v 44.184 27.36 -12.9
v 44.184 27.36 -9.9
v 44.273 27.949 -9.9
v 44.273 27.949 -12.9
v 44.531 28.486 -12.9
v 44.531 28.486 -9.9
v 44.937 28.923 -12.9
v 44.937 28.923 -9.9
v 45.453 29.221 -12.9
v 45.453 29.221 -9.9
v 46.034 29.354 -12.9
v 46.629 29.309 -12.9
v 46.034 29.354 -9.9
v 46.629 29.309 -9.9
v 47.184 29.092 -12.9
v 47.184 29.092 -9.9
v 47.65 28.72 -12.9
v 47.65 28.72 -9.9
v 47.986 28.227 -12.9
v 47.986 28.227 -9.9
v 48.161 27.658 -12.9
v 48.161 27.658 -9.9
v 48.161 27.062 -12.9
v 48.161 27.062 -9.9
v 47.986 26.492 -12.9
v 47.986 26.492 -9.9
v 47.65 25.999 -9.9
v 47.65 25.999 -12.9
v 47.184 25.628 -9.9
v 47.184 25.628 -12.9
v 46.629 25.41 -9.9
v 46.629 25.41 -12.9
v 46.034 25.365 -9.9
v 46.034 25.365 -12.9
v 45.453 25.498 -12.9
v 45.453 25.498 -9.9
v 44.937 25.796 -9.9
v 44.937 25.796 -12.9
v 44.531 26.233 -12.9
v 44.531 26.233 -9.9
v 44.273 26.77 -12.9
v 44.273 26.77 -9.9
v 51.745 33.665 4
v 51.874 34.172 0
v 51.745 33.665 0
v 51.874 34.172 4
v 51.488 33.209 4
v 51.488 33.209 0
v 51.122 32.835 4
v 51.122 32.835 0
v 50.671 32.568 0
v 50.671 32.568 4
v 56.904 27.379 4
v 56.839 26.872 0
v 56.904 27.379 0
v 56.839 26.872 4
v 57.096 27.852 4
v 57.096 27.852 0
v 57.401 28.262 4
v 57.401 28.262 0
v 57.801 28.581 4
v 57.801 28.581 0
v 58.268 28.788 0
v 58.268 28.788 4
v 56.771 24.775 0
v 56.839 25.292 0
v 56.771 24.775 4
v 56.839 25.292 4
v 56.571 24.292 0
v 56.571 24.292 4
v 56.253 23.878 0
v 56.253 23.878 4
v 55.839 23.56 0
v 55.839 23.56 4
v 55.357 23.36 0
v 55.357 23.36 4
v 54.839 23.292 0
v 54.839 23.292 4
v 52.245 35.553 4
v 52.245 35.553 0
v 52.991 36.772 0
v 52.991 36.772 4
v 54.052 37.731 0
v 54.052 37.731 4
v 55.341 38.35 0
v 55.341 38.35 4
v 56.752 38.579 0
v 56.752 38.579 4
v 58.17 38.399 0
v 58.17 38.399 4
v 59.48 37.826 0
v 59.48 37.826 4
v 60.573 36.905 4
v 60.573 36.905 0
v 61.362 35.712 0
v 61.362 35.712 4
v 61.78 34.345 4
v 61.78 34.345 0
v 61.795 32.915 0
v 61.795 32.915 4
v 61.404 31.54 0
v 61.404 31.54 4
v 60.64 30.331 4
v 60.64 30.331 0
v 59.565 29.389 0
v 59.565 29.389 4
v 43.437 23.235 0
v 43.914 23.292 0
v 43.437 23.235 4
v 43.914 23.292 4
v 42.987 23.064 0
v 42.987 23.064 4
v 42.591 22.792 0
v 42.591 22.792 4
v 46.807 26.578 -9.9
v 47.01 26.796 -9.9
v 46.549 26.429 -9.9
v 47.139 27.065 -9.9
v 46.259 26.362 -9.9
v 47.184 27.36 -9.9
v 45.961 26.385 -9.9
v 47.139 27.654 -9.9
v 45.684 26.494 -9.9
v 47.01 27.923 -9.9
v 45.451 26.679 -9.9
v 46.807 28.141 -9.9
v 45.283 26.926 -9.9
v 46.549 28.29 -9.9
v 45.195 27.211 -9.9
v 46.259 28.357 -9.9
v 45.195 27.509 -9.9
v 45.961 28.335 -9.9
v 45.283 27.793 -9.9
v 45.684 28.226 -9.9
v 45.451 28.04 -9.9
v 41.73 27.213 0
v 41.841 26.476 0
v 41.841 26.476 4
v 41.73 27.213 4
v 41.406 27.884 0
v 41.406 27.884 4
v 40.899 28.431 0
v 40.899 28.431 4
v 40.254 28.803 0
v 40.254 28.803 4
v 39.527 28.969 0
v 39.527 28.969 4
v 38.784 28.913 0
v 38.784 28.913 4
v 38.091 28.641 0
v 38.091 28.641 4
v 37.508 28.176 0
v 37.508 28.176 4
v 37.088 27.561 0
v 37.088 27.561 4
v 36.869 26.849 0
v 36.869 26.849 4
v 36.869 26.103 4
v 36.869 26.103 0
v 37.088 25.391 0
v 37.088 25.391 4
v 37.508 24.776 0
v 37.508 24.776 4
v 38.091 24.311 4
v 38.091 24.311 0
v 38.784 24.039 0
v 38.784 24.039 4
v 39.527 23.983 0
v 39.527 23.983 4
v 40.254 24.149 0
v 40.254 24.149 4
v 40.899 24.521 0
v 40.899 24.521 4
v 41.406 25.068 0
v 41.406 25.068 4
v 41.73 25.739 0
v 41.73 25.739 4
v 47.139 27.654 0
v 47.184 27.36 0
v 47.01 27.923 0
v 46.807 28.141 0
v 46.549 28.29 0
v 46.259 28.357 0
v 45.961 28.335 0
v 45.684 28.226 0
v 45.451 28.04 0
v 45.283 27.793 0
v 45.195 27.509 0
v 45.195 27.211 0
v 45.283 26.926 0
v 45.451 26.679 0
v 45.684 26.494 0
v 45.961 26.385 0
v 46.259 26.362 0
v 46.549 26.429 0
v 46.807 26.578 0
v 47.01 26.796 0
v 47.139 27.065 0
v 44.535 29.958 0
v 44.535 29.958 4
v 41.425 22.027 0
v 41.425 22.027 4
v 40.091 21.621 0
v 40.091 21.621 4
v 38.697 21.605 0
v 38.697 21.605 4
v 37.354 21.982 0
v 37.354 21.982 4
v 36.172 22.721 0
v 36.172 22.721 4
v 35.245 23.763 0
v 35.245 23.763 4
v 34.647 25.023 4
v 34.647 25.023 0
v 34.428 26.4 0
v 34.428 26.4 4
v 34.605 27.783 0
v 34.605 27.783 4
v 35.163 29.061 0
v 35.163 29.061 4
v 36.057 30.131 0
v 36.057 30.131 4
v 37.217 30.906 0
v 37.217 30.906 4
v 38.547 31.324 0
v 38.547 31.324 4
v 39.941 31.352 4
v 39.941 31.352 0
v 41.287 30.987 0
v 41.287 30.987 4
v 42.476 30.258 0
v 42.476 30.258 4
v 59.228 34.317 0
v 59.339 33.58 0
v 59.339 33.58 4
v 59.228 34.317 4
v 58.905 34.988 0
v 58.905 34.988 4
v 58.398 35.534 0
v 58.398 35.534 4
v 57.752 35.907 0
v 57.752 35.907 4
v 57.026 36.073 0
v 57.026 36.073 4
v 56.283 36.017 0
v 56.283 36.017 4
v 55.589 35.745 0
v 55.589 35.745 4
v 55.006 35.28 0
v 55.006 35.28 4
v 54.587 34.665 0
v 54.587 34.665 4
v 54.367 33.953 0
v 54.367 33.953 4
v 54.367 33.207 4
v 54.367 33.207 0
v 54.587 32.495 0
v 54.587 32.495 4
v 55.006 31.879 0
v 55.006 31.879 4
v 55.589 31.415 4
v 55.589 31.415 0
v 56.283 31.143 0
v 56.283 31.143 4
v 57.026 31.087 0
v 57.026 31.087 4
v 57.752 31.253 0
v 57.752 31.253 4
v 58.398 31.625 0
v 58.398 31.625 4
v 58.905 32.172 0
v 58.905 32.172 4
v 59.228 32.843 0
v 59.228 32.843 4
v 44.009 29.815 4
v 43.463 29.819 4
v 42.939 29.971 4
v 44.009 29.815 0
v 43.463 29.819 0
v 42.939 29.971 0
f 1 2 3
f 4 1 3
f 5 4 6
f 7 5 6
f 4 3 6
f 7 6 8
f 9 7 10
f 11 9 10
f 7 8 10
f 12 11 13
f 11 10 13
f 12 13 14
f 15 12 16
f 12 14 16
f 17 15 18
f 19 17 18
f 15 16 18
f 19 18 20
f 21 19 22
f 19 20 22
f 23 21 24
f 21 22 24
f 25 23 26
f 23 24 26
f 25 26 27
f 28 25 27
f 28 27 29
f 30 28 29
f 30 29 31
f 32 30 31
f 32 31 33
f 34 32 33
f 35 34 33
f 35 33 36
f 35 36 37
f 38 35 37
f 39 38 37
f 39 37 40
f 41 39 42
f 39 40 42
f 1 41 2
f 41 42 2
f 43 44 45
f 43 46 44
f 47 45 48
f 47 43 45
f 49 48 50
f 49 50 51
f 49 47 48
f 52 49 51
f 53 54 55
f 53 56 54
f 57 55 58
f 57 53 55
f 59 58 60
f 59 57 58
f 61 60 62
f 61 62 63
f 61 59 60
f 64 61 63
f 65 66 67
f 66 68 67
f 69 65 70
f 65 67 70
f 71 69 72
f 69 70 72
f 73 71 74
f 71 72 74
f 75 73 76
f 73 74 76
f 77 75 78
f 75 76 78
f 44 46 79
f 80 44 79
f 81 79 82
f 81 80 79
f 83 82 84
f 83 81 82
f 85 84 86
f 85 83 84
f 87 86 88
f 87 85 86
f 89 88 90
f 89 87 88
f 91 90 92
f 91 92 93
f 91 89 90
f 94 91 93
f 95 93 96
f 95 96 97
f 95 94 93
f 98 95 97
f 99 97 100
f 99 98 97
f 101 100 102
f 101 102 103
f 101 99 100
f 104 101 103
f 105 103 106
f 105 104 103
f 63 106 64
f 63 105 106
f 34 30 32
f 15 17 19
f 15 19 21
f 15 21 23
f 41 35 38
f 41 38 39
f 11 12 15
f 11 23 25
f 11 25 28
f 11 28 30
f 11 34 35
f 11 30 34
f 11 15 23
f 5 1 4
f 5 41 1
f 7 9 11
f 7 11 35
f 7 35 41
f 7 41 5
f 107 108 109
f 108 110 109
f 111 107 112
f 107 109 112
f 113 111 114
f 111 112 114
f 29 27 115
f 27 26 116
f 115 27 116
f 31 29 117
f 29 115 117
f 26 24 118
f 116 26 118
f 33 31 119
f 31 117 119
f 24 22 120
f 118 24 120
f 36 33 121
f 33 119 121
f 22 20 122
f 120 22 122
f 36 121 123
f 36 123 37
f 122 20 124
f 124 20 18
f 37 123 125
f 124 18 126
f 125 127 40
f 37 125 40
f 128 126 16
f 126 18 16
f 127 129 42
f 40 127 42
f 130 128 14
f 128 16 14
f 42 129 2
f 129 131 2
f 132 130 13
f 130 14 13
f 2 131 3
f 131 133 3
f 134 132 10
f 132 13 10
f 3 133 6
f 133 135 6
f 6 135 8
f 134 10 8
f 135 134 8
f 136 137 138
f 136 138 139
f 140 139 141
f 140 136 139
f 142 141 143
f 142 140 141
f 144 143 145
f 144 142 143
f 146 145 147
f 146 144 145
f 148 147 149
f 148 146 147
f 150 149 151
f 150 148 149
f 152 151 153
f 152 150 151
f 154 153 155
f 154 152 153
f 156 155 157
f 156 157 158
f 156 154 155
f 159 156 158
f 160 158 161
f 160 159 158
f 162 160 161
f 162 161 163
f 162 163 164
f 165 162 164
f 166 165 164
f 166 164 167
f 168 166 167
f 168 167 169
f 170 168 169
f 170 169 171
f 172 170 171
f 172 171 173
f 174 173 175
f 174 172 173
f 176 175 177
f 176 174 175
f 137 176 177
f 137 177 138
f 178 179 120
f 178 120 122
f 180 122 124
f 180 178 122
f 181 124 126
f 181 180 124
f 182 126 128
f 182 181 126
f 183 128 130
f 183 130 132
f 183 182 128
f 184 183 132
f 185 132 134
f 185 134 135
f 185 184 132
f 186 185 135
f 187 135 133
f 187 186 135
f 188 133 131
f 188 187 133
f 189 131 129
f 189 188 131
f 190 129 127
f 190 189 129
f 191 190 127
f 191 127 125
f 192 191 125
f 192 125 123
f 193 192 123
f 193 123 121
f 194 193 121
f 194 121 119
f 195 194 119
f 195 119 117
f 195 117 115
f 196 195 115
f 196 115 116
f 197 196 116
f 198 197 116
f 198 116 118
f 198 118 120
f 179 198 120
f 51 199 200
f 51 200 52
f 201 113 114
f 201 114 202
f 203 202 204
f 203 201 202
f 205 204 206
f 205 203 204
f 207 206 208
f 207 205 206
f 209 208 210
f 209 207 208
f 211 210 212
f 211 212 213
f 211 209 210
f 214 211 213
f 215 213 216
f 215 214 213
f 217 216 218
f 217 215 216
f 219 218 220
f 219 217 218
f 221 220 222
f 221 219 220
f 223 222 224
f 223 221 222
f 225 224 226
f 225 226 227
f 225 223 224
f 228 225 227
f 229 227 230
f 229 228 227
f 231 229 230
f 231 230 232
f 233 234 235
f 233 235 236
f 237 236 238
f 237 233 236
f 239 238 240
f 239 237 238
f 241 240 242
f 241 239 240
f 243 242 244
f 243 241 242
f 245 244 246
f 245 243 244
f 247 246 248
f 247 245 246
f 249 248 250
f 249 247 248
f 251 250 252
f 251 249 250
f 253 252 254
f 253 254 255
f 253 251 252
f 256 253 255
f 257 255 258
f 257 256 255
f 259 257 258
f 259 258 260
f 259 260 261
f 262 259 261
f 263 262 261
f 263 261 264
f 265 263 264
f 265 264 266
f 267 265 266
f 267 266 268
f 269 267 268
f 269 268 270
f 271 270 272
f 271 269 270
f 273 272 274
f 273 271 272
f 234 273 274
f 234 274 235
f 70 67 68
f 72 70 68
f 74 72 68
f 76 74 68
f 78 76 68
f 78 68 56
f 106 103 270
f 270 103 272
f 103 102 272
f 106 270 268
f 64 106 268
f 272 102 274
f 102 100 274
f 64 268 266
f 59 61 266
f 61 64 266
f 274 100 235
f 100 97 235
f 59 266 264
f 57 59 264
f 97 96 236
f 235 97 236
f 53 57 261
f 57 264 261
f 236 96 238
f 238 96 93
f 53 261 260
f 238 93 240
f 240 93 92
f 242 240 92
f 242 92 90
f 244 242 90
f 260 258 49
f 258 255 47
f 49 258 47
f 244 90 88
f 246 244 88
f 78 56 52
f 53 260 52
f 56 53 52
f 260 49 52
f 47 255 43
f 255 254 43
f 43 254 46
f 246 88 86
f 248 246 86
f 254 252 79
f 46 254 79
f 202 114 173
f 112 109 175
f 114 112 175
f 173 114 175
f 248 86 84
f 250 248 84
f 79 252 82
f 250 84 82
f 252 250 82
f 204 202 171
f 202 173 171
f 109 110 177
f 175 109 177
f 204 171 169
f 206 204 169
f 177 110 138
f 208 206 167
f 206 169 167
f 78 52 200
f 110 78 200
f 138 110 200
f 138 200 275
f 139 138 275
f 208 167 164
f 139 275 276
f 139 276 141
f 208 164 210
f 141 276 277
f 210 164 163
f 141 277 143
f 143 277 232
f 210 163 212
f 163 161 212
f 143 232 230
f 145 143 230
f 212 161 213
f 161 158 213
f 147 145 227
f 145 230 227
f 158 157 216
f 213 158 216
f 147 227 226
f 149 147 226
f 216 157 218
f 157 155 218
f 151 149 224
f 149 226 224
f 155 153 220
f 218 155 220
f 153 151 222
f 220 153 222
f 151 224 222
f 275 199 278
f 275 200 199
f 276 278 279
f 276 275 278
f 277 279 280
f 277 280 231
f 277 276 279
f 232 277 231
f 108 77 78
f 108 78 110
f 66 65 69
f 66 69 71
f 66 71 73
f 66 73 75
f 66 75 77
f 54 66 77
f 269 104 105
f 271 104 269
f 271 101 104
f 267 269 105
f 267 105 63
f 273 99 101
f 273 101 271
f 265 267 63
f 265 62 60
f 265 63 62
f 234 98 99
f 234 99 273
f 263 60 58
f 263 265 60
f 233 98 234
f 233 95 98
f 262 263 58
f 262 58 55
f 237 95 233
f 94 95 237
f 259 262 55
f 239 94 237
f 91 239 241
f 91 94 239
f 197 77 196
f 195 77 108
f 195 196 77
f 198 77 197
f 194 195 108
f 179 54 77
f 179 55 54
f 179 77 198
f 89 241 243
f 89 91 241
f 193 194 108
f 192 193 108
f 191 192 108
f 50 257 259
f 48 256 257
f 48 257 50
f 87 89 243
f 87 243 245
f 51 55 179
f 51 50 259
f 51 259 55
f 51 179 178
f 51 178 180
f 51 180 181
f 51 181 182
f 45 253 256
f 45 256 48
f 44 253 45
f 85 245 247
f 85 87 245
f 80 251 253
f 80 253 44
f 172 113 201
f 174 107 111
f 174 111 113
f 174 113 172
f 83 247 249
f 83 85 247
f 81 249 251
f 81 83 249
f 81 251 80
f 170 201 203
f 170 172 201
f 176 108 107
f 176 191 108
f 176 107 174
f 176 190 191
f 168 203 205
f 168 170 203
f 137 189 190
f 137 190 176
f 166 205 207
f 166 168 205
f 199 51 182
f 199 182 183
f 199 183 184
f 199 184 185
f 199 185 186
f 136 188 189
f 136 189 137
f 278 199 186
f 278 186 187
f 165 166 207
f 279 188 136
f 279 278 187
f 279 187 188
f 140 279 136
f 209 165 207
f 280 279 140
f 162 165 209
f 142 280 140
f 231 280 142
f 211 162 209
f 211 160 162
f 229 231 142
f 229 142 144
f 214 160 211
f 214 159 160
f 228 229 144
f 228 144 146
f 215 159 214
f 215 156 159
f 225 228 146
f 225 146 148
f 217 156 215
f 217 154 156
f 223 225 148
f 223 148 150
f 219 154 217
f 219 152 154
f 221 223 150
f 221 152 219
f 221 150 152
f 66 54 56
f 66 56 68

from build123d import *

# Parameters (mm, degrees)
SKETCH1_R           = 2.5
BOSS_EXTRUDE1_DEPTH = 4
FILLET1_R           = 2
BOSS_EXTRUDE2_START = -3.9
SKETCH2_R           = 1
BOSS_EXTRUDE2_DEPTH = 10
SKETCH3_R           = 2
BOSS_EXTRUDE3_DEPTH = 3


with BuildPart() as part:
    # Sketch1 → Boss-Extrude1 (new body)
    with BuildSketch(Plane.XY):
        with BuildLine():
            Line((56.839071038, 28.579919803), (56.839071038, 23.292312115))
            Line((56.839071038, 23.292312115), (43.08257304, 23.292312115))
            ThreePointArc((43.08257304, 23.292312115), (34.429928081, 26.628647856), (43.273147001, 29.420937259))
            Line((43.273147001, 29.420937259), (51.8645252, 33.076041142))
            ThreePointArc((51.8645252, 33.076041142), (60.191727201, 37.289326312), (56.839071038, 28.579919803))
        make_face()
        with Locations((39.340592987, 26.475947236)):
            Circle(SKETCH1_R, mode=Mode.SUBTRACT)
        with Locations((56.839071038, 33.579919803)):
            Circle(SKETCH1_R, mode=Mode.SUBTRACT)
    extrude(amount=BOSS_EXTRUDE1_DEPTH)

    # Fillet1
    fillet1_edges = [part.edges().sort_by_distance(p)[0] for p in [
        (56.839071038, 28.579919803, 2),
        (56.839071038, 23.292312115, 2),
        (43.08257304, 23.292312115, 2),
        (43.273147001, 29.420937259, 2),
        (51.8645252, 33.076041142, 2),
    ]]
    fillet(fillet1_edges, radius=FILLET1_R)

    # Sketch2 → Boss-Extrude2 (add)
    with BuildSketch(Plane.XY.offset(4).offset(BOSS_EXTRUDE2_START)):
        with Locations((46.18381054, 27.359606691)):
            Circle(SKETCH2_R)
    extrude(amount=-BOSS_EXTRUDE2_DEPTH)

    # Sketch3 → Boss-Extrude3 (add)
    with BuildSketch(Plane(origin=(0, 0, -9.9), x_dir=(-1, 0, 0), z_dir=(0, 0, -1))):
        with Locations((-46.18381054, 27.359606691)):
            Circle(SKETCH3_R)
    extrude(amount=BOSS_EXTRUDE3_DEPTH)


solid = part.part
